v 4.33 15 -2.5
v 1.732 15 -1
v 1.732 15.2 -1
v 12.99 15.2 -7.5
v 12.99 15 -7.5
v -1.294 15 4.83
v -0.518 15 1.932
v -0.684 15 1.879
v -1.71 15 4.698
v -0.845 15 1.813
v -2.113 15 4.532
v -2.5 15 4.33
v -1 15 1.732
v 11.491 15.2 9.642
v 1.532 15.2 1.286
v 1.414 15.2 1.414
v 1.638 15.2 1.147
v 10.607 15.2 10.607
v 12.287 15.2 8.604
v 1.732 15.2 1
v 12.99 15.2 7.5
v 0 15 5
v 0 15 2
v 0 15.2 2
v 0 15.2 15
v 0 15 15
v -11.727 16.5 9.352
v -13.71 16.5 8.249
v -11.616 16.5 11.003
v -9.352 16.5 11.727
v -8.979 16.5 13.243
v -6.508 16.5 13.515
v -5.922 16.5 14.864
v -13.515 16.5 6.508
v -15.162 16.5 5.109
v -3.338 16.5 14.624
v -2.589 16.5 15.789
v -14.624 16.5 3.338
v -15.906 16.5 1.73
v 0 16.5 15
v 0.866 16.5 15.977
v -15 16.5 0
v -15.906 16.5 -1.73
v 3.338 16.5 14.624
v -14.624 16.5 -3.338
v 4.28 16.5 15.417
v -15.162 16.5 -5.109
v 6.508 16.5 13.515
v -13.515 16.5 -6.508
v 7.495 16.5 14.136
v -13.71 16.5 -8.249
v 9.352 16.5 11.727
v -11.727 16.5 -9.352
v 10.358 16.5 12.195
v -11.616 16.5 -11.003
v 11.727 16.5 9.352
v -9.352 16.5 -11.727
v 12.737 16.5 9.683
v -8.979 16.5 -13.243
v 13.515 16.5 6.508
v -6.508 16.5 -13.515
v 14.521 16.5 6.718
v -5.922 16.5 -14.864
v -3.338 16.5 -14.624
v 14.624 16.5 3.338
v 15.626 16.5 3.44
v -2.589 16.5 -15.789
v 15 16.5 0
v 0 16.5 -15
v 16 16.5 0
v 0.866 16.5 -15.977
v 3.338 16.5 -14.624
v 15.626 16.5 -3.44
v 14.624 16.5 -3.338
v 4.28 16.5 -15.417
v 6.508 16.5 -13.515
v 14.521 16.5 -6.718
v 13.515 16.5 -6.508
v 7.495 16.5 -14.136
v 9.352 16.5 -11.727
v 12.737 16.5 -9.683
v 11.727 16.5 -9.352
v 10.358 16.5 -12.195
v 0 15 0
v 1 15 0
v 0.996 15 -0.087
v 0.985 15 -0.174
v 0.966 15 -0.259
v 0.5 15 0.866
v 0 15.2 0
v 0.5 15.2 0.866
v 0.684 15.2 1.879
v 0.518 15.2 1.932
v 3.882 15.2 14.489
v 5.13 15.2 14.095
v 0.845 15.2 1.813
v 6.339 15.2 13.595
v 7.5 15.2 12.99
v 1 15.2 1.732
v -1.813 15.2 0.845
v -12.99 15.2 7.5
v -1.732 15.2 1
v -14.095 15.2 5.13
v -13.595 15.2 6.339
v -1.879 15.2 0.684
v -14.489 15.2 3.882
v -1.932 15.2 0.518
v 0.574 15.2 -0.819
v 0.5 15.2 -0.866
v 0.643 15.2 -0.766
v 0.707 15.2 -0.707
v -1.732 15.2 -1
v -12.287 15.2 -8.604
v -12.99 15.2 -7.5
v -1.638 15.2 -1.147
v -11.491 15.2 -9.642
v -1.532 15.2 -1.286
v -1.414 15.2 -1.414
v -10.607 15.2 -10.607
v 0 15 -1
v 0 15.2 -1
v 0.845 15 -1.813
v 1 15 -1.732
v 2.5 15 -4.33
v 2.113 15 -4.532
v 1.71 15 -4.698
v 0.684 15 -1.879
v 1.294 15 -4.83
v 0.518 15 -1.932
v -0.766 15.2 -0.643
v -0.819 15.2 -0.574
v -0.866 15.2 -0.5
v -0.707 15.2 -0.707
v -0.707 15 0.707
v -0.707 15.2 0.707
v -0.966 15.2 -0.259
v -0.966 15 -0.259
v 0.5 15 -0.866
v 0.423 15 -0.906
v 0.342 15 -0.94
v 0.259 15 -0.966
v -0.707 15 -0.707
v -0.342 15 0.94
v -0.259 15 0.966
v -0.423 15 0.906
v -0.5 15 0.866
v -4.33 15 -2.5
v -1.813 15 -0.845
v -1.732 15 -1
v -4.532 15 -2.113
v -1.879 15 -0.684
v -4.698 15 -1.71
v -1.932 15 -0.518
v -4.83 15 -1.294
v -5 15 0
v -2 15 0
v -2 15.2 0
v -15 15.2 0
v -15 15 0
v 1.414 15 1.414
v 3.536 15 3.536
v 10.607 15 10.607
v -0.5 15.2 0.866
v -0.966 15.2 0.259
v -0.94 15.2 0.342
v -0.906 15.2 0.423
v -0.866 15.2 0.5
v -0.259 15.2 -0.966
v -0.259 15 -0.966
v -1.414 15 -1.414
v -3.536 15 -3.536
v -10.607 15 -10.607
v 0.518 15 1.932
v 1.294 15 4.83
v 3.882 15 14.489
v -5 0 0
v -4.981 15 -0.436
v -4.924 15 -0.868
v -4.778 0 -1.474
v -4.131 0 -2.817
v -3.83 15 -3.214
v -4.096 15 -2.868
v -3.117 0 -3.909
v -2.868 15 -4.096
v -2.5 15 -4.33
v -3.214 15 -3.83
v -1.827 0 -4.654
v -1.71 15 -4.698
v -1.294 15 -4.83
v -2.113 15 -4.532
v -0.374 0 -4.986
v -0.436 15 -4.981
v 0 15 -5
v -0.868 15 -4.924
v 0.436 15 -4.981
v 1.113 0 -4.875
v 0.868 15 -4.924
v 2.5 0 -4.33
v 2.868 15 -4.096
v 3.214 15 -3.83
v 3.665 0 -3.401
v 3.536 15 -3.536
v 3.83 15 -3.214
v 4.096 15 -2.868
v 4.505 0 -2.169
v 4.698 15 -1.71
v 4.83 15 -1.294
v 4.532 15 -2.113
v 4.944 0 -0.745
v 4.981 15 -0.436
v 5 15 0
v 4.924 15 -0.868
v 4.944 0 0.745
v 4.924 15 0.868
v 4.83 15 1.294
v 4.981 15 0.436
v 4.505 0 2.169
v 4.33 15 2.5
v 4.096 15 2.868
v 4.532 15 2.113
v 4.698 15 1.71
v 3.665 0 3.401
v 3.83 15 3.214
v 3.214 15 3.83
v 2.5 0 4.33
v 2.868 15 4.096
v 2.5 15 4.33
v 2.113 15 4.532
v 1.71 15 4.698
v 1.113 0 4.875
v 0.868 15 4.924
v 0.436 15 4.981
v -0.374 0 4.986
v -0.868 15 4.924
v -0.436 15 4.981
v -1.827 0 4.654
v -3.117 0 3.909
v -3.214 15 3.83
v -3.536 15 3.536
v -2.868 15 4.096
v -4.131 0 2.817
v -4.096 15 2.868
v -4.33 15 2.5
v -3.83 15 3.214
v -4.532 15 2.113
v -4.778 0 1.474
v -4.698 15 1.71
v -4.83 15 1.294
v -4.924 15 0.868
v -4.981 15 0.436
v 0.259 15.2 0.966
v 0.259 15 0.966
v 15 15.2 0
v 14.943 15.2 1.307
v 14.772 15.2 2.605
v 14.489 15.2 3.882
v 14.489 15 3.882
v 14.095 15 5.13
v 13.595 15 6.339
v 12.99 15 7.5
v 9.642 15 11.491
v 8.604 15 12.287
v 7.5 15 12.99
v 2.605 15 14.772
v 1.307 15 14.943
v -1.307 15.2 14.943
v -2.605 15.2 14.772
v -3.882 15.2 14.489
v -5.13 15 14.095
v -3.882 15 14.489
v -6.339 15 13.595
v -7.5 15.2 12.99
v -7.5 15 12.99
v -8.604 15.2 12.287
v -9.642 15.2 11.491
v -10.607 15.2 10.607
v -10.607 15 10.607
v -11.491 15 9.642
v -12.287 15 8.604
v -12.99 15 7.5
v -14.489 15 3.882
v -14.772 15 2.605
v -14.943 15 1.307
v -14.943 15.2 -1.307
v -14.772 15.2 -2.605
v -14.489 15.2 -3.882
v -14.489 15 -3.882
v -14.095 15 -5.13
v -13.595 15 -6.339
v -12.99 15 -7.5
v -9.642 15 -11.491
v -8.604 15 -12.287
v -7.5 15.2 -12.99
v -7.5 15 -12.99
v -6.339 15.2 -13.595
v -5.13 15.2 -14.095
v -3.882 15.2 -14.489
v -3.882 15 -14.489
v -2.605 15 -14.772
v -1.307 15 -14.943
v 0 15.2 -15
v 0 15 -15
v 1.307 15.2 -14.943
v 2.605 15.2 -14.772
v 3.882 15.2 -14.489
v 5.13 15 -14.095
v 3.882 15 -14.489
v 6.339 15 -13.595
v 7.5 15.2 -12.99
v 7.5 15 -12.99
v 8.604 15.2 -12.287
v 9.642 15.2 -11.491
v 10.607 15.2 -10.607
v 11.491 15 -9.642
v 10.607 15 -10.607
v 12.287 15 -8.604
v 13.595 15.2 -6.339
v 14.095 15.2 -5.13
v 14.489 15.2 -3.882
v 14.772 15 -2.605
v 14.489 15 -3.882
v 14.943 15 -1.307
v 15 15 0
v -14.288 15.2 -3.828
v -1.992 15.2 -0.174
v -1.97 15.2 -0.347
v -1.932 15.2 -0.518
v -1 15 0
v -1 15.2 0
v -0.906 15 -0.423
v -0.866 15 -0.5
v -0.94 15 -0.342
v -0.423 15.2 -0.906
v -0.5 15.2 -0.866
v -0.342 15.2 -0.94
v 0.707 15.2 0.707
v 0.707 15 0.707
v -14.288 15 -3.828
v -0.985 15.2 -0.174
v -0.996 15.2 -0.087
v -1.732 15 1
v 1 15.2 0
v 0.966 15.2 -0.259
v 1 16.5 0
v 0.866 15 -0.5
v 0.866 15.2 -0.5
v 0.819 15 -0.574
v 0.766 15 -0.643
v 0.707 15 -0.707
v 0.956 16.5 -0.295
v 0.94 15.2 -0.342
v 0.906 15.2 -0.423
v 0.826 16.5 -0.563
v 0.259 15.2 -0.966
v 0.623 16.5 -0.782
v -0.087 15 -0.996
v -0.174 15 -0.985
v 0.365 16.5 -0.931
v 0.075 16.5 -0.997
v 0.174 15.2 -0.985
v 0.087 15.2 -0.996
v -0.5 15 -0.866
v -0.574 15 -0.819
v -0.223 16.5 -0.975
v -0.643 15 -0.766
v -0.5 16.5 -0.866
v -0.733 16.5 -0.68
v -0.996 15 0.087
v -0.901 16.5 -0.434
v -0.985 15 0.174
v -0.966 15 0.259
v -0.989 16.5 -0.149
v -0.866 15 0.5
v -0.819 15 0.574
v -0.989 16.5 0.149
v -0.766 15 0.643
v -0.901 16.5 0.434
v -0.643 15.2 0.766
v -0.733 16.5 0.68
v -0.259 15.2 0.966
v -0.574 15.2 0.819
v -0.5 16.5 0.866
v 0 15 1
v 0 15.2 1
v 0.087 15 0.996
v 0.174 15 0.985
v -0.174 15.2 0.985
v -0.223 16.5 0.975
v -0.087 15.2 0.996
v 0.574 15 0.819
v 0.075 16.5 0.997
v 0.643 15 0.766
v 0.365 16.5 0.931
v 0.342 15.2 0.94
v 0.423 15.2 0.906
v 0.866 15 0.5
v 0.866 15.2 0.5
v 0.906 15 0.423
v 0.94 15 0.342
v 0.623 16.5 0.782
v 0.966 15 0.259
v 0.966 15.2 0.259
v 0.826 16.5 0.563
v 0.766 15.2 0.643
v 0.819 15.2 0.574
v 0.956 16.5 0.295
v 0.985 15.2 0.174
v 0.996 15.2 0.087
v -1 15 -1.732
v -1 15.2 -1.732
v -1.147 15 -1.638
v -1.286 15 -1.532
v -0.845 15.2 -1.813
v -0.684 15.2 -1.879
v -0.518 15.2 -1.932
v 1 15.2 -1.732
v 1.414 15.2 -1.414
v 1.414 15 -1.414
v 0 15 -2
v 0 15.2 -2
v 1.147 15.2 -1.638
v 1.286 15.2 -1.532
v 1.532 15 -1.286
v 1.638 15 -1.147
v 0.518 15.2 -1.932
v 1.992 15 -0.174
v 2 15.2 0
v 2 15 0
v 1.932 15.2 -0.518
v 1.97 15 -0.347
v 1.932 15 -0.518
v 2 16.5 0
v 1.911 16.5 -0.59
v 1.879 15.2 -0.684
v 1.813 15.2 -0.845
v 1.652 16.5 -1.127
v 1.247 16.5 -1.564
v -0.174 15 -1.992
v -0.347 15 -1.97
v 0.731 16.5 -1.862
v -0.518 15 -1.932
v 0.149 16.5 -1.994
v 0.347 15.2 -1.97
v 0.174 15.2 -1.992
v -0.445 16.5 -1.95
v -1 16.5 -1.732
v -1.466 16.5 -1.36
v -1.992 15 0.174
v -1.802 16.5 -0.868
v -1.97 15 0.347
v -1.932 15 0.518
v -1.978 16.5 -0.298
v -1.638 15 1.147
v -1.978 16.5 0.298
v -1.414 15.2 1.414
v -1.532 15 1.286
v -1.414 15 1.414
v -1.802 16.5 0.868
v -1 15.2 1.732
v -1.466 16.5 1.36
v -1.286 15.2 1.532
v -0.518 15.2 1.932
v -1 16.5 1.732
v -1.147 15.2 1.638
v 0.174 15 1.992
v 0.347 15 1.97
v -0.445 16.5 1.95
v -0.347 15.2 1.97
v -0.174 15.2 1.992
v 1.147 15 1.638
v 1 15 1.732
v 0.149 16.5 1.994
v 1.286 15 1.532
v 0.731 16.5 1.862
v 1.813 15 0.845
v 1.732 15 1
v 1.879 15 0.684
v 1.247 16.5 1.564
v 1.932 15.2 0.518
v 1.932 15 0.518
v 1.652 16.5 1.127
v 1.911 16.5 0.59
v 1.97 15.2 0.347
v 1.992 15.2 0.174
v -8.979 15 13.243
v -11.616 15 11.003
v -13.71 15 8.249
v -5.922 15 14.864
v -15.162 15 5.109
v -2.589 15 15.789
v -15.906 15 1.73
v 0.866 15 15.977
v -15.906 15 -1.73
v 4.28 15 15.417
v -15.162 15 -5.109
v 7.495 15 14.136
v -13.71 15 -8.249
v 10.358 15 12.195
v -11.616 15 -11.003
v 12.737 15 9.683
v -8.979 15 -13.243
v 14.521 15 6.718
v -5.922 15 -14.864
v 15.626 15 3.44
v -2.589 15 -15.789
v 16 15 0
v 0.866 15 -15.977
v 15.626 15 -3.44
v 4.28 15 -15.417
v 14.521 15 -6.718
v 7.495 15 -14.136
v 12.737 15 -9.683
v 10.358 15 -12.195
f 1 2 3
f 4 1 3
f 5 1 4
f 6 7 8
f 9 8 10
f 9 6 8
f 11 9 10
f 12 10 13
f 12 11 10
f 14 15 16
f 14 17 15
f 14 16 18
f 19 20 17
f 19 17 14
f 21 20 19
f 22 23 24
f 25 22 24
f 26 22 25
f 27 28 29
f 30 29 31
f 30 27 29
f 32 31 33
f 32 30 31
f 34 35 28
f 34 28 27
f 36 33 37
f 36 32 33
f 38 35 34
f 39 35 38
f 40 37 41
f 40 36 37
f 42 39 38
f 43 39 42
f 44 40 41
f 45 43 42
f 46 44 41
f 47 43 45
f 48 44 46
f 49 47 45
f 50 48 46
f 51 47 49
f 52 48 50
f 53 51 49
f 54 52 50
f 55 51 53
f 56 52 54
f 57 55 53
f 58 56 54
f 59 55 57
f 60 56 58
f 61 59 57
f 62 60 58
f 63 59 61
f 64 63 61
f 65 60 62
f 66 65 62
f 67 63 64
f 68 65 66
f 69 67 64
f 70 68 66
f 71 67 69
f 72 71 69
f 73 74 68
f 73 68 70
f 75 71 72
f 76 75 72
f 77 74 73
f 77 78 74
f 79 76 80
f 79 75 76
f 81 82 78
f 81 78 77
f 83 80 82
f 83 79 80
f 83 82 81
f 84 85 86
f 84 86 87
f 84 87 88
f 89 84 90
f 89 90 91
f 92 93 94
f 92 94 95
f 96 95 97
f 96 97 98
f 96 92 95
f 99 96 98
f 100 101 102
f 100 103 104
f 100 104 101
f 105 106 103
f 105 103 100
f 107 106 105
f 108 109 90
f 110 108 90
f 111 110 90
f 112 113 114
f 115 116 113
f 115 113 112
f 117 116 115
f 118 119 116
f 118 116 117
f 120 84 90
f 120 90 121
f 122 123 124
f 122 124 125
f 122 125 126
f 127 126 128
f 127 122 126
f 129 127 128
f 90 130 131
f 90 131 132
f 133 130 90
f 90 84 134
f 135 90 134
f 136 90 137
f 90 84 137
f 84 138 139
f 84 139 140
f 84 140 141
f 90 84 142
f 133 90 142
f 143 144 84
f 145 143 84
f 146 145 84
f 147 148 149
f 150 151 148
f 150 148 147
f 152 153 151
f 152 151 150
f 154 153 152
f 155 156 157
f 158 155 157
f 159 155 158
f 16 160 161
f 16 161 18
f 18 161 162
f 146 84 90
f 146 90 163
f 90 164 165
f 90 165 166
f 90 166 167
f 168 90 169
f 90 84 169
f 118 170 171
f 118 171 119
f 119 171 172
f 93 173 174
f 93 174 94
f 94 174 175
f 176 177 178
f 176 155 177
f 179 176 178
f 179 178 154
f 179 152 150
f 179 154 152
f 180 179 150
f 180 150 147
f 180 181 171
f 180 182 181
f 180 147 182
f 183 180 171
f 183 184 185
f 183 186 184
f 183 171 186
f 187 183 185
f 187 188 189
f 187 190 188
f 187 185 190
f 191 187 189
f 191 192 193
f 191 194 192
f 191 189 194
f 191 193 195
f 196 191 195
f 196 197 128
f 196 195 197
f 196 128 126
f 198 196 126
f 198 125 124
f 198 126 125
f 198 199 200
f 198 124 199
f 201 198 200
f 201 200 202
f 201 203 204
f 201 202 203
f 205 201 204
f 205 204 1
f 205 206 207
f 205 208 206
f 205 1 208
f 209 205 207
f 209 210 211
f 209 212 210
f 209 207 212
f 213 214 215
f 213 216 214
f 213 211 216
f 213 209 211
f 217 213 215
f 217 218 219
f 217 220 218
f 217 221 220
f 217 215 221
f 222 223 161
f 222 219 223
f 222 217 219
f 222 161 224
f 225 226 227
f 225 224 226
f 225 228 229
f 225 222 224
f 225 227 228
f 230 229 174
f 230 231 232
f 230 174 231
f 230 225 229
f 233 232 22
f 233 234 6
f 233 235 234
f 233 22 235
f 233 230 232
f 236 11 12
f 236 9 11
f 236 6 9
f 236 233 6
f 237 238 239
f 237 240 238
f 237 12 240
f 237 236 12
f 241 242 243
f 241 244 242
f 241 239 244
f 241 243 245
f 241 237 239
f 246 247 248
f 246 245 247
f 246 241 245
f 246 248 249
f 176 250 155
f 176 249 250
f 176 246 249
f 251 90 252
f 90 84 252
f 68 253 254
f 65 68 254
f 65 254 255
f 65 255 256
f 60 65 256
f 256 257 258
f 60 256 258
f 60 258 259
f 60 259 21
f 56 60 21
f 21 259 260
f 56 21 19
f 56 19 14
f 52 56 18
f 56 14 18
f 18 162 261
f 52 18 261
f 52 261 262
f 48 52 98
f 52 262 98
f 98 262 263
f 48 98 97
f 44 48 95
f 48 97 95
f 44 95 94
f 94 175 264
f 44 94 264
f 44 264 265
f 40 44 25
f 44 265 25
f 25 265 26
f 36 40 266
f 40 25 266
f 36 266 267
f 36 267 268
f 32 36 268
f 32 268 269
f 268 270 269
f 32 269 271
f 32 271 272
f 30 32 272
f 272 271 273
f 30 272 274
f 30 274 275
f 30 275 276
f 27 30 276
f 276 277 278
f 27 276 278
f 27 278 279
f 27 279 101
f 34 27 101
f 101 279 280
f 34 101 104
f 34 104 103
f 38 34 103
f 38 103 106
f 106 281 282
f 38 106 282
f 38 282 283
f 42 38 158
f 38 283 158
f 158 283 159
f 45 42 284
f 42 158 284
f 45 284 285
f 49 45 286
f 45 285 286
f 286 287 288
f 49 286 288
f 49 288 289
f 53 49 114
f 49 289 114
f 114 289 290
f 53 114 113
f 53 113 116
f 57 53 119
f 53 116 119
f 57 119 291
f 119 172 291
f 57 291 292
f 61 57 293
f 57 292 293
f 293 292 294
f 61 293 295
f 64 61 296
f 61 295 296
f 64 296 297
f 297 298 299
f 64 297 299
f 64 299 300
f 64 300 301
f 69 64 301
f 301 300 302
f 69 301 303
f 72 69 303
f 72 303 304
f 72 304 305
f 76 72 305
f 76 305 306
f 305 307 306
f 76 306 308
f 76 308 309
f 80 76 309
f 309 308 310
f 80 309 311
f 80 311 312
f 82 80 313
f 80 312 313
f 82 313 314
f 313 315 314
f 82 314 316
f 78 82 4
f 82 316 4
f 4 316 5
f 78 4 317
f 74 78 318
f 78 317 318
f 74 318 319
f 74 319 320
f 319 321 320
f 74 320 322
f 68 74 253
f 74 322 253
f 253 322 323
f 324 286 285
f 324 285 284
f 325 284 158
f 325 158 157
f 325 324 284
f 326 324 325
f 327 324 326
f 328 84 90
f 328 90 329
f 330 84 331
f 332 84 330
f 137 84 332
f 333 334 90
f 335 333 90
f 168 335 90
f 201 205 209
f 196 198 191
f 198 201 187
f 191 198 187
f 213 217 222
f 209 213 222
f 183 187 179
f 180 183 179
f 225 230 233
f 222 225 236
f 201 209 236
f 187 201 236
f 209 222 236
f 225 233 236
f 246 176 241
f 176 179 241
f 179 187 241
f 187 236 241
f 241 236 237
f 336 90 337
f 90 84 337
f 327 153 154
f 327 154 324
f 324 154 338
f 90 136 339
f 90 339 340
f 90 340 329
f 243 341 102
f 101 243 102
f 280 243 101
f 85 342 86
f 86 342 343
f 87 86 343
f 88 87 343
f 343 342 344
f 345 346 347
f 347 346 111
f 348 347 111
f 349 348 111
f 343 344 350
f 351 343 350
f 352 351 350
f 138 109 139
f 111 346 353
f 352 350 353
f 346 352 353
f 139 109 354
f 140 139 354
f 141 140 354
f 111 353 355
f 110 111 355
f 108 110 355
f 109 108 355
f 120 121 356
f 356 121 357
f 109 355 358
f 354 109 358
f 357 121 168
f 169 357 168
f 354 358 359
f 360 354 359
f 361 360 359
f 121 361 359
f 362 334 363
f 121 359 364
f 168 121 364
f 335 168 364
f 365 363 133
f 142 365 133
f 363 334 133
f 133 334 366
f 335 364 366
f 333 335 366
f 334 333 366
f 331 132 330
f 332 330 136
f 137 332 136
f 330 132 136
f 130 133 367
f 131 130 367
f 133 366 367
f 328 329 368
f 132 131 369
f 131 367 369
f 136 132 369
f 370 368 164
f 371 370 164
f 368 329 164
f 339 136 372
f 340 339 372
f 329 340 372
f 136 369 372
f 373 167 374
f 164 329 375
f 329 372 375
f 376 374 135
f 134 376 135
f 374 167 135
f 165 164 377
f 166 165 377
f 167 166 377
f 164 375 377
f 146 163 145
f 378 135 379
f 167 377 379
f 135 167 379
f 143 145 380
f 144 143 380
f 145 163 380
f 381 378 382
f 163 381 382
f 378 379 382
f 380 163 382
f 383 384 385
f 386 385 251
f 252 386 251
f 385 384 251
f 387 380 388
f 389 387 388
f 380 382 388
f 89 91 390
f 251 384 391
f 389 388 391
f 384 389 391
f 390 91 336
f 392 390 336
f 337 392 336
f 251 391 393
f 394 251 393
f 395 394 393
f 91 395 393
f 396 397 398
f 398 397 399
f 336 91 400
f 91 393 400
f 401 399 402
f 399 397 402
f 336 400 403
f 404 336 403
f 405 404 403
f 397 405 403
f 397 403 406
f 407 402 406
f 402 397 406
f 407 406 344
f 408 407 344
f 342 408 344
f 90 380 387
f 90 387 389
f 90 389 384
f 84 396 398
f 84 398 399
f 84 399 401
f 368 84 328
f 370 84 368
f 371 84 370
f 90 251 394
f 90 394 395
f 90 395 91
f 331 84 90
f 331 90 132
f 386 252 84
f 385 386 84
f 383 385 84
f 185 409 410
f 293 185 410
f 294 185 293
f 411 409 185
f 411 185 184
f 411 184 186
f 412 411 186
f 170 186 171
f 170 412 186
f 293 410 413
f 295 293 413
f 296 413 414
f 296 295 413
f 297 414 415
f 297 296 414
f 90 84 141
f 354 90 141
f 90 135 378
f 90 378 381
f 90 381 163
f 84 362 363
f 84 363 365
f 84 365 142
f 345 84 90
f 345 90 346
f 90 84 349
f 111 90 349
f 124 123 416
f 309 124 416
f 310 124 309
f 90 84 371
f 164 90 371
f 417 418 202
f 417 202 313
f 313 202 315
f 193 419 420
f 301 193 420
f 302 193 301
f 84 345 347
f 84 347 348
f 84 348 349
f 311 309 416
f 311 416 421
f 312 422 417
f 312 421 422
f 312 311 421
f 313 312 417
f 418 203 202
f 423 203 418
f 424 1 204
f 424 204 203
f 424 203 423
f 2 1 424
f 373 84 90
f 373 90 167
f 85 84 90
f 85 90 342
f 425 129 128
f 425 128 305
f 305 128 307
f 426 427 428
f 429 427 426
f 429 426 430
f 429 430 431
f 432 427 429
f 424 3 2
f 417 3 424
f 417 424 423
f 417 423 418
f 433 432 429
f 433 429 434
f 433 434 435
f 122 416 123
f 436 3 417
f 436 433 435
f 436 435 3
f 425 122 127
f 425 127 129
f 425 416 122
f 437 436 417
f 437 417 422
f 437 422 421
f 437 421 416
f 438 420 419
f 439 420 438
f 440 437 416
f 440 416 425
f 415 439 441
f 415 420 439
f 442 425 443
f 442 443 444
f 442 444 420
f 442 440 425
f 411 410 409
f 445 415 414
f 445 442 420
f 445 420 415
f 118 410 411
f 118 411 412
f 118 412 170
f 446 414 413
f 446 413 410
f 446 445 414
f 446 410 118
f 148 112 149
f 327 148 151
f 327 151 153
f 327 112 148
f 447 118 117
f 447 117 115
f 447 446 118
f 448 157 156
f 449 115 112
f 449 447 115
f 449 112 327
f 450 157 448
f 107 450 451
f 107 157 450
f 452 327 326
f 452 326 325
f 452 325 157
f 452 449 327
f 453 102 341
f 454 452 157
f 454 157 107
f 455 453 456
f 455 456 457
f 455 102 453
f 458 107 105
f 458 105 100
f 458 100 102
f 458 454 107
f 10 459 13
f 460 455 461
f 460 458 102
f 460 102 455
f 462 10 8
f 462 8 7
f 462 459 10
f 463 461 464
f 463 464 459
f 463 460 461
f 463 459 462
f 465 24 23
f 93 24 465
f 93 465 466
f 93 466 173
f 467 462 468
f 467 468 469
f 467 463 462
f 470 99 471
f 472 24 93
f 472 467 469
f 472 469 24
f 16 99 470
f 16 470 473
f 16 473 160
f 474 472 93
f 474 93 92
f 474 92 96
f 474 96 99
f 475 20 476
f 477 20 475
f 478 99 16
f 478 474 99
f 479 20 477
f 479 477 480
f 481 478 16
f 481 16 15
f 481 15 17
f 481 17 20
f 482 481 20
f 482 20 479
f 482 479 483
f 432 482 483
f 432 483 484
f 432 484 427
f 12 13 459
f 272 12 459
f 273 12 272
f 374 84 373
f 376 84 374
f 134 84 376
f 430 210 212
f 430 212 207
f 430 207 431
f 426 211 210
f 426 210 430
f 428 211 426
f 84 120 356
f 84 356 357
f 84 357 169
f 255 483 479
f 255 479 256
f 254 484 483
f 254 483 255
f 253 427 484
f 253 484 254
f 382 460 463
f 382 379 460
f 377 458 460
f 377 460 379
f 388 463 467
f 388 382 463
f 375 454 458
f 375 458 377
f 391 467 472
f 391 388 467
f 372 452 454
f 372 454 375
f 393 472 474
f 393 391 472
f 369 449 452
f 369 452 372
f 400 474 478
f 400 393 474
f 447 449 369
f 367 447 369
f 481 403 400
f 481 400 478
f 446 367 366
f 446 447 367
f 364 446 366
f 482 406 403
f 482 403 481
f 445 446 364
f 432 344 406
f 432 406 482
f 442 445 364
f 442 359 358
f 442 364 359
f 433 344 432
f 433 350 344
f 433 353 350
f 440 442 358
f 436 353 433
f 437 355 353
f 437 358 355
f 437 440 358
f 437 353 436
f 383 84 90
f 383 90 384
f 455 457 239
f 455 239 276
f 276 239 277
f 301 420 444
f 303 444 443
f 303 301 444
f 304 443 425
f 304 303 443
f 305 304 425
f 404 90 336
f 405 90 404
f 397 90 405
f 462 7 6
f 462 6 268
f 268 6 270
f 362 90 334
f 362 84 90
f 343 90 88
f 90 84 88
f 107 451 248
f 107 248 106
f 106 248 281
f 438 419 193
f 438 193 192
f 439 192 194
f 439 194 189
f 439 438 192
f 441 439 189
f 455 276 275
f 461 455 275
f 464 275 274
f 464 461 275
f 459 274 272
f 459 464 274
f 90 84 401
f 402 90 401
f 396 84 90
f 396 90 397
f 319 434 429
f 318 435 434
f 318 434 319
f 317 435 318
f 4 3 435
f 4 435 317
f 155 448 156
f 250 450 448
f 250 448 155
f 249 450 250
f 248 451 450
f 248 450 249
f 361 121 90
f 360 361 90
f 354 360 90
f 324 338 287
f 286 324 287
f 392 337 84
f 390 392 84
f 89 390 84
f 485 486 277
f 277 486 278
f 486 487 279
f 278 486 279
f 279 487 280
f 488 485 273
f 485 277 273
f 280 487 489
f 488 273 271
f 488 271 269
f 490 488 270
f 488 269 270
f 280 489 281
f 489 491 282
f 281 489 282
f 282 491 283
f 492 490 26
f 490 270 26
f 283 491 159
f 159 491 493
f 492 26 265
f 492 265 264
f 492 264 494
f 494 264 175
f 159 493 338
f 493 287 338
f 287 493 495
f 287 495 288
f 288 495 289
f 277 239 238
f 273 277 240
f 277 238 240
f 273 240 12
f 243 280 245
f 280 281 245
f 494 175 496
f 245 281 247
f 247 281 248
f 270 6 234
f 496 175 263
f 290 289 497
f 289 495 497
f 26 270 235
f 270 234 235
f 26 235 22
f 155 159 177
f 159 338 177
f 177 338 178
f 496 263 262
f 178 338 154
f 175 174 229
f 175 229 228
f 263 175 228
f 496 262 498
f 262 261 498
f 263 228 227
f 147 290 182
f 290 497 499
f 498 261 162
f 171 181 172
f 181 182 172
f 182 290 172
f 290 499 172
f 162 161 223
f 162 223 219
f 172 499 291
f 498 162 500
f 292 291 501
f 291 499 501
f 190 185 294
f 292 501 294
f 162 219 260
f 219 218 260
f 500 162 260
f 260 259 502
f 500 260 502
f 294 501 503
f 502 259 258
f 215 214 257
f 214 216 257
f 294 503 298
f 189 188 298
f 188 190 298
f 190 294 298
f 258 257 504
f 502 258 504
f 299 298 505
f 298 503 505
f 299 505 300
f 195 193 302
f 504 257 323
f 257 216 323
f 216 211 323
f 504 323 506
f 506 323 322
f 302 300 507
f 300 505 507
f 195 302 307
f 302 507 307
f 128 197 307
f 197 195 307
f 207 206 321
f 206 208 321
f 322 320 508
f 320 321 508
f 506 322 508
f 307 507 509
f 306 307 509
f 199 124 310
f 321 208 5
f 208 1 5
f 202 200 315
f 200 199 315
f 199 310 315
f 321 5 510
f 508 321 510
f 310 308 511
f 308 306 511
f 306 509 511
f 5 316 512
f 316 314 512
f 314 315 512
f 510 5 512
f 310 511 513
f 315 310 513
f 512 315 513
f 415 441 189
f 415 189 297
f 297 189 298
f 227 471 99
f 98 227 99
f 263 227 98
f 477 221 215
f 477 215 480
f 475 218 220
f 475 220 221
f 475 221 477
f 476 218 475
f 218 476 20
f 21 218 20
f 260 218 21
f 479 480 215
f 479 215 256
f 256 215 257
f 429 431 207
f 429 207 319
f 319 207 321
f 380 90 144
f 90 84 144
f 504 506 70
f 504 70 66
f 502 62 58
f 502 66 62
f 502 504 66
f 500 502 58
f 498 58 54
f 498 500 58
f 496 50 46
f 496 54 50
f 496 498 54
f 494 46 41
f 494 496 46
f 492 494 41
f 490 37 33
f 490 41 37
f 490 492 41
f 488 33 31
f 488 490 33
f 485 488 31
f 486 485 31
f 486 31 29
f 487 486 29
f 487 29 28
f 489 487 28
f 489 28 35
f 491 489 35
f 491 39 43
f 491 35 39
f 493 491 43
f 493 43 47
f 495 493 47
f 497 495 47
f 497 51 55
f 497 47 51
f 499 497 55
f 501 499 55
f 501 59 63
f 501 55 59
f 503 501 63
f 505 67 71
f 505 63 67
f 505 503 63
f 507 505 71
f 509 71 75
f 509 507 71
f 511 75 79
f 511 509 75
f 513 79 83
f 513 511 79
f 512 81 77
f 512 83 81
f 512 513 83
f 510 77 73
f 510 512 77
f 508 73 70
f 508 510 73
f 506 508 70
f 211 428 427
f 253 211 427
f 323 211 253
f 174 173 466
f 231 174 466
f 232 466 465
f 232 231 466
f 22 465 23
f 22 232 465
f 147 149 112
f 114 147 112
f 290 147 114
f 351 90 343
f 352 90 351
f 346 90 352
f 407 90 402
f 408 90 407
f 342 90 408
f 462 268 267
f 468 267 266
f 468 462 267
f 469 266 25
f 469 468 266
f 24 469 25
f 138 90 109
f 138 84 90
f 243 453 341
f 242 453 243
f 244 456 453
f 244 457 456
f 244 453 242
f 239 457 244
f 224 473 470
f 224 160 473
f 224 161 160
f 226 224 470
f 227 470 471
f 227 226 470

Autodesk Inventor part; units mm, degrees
ref_plane "YZ Plane" through (0, 0, 0) normal (1, 0, 0) x (0, 1, 0)
ref_plane "XZ Plane" through (0, 0, 0) normal (0, 1, 0) x (-1, 0, 0)
ref_plane "XY Plane" through (0, 0, 0) normal (0, 0, 1) x (1, 0, 0)
sketch "스케치1" plane through (0, 0, 0) normal (0, 1, 0) x (-1, 0, 0)
  circle A0 centre (0, 0) radius 5
  dimension "d0" = 10
extrude "돌출1" add sketch "스케치1" along normal blind 15
sketch "스케치2" plane through (0, 15, 0) normal (0, 1, 0) x (1, 0, 0)
  circle A0 centre (0, 0) radius 15
  circle A1 centre (0, 0) radius 16
  dimension "d3" = 30
  dimension "d4" = 32
extrude "돌출2" add sketch "스케치2" along normal blind 1.5
sketch "스케치3" plane through (0, 15, 0) normal (0, 1, 0) x (1, 0, 0)
  line L0 (0, 0) -> (15, 0)
  circle A0 centre (0, 0) radius 15 projected
  line L1 (0, 0) -> (14.4889, 3.8823)
  line L2 (0, 0) -> (15, 0) construction
  line L3 (0, 0) -> (12.9904, 7.5)
  line L4 (0, 0) -> (15, 0) construction
  line L5 (0, 0) -> (10.6066, 10.6066)
  line L6 (0, 0) -> (15, 0) construction
  line L7 (0, 0) -> (7.5, 12.9904)
  line L8 (0, 0) -> (15, 0) construction
  line L9 (0, 0) -> (3.8823, 14.4889)
  line L10 (0, 0) -> (15, 0) construction
  line L11 (0, 0) -> (0, 15)
  line L12 (0, 0) -> (-3.8823, 14.4889)
  line L13 (0, 0) -> (-7.5, 12.9904)
  line L14 (0, 0) -> (-10.6066, 10.6066)
  line L15 (0, 0) -> (-12.9904, 7.5)
  line L16 (0, 0) -> (-14.2878, 3.8284)
  line L17 (0, 0) -> (-12.9904, -7.5)
  line L18 (0, 0) -> (-7.5, -12.9904)
  line L19 (0, 0) -> (0, -15)
  line L20 (0, 0) -> (10.6066, -10.6066)
  line L21 (0, 0) -> (12.9904, -7.5)
  line L22 (0, 0) -> (14.4889, -3.8823)
  line L23 (0, 0) -> (-15, 0)
  line L24 (0, 0) -> (-14.4889, -3.8823)
  line L25 (0, 0) -> (0, 0)
  line L26 (0, 0) -> (-10.6066, -10.6066)
  line L27 (0, 0) -> (-3.8823, -14.4889)
  line L28 (0, 0) -> (7.5, -12.9904)
  line L29 (0, 0) -> (3.8823, -14.4889)
  line L30 (0, 0) -> (-14.4889, 3.8823)
  dimension "d12" = 15
  dimension "d13" = 15
  dimension "d14" = 15
  dimension "d15" = 15
  dimension "d16" = 15
  dimension "d17" = 15
  dimension "d18" = 15
  dimension "d19" = 15
  dimension "d21" = 15
  dimension "d22" = 15
  dimension "d23" = 15
  dimension "d24" = 15
  dimension "d25" = 15
  dimension "d26" = 15
  dimension "d27" = 15
  dimension "d28" = 15
  dimension "d29" = 15
  dimension "d30" = 15
  dimension "d31" = 15
  dimension "d32" = 15
  dimension "d33" = 15
  dimension "d34" = 15
  dimension "d35" = 15
  dimension "d36" = 15
  dimension "d7" = 15
  dimension "d8" = 30
  dimension "d9" = 45
  dimension "d10" = 60
  dimension "d11" = 75
  dimension "d20" = 15
extrude "돌출3" add sketch "스케치3" along normal blind 0.2 contours L3 A0 L1 | L7 A0 L5 | L11 A0 L9 | L13 A0 L12 | L15 A0 L14 | L23 A0 L30 L16 | L21 A0 L20 | L0 A0 L22 | L17 A0 L24 | L18 A0 L26 | L19 A0 L27 | L28 A0 L29
sketch "스케치4" plane through (0, 16.5, 0) normal (0, 1, 0) x (1, 0, 0)
  line L0 (0, 0) -> (10.6066, 10.6066) projected
  circle A0 centre (0, 0) radius 2
  line L1 (0, 0) -> (14.4889, 3.8823) projected
  circle A1 centre (0, 0) radius 1
  dimension "d39" = 4
  dimension "d40" = 2
extrude "돌출4" add sketch "스케치4" against normal blind 2 contours A1 L1 A0 L0 | L0 A0 L1 A1
sketch "스케치5" plane through (0, 16.5, 0) normal (0, 1, 0) x (1, 0, 0)
  point P0 (0, 0)
properties part number "fan_num3"
